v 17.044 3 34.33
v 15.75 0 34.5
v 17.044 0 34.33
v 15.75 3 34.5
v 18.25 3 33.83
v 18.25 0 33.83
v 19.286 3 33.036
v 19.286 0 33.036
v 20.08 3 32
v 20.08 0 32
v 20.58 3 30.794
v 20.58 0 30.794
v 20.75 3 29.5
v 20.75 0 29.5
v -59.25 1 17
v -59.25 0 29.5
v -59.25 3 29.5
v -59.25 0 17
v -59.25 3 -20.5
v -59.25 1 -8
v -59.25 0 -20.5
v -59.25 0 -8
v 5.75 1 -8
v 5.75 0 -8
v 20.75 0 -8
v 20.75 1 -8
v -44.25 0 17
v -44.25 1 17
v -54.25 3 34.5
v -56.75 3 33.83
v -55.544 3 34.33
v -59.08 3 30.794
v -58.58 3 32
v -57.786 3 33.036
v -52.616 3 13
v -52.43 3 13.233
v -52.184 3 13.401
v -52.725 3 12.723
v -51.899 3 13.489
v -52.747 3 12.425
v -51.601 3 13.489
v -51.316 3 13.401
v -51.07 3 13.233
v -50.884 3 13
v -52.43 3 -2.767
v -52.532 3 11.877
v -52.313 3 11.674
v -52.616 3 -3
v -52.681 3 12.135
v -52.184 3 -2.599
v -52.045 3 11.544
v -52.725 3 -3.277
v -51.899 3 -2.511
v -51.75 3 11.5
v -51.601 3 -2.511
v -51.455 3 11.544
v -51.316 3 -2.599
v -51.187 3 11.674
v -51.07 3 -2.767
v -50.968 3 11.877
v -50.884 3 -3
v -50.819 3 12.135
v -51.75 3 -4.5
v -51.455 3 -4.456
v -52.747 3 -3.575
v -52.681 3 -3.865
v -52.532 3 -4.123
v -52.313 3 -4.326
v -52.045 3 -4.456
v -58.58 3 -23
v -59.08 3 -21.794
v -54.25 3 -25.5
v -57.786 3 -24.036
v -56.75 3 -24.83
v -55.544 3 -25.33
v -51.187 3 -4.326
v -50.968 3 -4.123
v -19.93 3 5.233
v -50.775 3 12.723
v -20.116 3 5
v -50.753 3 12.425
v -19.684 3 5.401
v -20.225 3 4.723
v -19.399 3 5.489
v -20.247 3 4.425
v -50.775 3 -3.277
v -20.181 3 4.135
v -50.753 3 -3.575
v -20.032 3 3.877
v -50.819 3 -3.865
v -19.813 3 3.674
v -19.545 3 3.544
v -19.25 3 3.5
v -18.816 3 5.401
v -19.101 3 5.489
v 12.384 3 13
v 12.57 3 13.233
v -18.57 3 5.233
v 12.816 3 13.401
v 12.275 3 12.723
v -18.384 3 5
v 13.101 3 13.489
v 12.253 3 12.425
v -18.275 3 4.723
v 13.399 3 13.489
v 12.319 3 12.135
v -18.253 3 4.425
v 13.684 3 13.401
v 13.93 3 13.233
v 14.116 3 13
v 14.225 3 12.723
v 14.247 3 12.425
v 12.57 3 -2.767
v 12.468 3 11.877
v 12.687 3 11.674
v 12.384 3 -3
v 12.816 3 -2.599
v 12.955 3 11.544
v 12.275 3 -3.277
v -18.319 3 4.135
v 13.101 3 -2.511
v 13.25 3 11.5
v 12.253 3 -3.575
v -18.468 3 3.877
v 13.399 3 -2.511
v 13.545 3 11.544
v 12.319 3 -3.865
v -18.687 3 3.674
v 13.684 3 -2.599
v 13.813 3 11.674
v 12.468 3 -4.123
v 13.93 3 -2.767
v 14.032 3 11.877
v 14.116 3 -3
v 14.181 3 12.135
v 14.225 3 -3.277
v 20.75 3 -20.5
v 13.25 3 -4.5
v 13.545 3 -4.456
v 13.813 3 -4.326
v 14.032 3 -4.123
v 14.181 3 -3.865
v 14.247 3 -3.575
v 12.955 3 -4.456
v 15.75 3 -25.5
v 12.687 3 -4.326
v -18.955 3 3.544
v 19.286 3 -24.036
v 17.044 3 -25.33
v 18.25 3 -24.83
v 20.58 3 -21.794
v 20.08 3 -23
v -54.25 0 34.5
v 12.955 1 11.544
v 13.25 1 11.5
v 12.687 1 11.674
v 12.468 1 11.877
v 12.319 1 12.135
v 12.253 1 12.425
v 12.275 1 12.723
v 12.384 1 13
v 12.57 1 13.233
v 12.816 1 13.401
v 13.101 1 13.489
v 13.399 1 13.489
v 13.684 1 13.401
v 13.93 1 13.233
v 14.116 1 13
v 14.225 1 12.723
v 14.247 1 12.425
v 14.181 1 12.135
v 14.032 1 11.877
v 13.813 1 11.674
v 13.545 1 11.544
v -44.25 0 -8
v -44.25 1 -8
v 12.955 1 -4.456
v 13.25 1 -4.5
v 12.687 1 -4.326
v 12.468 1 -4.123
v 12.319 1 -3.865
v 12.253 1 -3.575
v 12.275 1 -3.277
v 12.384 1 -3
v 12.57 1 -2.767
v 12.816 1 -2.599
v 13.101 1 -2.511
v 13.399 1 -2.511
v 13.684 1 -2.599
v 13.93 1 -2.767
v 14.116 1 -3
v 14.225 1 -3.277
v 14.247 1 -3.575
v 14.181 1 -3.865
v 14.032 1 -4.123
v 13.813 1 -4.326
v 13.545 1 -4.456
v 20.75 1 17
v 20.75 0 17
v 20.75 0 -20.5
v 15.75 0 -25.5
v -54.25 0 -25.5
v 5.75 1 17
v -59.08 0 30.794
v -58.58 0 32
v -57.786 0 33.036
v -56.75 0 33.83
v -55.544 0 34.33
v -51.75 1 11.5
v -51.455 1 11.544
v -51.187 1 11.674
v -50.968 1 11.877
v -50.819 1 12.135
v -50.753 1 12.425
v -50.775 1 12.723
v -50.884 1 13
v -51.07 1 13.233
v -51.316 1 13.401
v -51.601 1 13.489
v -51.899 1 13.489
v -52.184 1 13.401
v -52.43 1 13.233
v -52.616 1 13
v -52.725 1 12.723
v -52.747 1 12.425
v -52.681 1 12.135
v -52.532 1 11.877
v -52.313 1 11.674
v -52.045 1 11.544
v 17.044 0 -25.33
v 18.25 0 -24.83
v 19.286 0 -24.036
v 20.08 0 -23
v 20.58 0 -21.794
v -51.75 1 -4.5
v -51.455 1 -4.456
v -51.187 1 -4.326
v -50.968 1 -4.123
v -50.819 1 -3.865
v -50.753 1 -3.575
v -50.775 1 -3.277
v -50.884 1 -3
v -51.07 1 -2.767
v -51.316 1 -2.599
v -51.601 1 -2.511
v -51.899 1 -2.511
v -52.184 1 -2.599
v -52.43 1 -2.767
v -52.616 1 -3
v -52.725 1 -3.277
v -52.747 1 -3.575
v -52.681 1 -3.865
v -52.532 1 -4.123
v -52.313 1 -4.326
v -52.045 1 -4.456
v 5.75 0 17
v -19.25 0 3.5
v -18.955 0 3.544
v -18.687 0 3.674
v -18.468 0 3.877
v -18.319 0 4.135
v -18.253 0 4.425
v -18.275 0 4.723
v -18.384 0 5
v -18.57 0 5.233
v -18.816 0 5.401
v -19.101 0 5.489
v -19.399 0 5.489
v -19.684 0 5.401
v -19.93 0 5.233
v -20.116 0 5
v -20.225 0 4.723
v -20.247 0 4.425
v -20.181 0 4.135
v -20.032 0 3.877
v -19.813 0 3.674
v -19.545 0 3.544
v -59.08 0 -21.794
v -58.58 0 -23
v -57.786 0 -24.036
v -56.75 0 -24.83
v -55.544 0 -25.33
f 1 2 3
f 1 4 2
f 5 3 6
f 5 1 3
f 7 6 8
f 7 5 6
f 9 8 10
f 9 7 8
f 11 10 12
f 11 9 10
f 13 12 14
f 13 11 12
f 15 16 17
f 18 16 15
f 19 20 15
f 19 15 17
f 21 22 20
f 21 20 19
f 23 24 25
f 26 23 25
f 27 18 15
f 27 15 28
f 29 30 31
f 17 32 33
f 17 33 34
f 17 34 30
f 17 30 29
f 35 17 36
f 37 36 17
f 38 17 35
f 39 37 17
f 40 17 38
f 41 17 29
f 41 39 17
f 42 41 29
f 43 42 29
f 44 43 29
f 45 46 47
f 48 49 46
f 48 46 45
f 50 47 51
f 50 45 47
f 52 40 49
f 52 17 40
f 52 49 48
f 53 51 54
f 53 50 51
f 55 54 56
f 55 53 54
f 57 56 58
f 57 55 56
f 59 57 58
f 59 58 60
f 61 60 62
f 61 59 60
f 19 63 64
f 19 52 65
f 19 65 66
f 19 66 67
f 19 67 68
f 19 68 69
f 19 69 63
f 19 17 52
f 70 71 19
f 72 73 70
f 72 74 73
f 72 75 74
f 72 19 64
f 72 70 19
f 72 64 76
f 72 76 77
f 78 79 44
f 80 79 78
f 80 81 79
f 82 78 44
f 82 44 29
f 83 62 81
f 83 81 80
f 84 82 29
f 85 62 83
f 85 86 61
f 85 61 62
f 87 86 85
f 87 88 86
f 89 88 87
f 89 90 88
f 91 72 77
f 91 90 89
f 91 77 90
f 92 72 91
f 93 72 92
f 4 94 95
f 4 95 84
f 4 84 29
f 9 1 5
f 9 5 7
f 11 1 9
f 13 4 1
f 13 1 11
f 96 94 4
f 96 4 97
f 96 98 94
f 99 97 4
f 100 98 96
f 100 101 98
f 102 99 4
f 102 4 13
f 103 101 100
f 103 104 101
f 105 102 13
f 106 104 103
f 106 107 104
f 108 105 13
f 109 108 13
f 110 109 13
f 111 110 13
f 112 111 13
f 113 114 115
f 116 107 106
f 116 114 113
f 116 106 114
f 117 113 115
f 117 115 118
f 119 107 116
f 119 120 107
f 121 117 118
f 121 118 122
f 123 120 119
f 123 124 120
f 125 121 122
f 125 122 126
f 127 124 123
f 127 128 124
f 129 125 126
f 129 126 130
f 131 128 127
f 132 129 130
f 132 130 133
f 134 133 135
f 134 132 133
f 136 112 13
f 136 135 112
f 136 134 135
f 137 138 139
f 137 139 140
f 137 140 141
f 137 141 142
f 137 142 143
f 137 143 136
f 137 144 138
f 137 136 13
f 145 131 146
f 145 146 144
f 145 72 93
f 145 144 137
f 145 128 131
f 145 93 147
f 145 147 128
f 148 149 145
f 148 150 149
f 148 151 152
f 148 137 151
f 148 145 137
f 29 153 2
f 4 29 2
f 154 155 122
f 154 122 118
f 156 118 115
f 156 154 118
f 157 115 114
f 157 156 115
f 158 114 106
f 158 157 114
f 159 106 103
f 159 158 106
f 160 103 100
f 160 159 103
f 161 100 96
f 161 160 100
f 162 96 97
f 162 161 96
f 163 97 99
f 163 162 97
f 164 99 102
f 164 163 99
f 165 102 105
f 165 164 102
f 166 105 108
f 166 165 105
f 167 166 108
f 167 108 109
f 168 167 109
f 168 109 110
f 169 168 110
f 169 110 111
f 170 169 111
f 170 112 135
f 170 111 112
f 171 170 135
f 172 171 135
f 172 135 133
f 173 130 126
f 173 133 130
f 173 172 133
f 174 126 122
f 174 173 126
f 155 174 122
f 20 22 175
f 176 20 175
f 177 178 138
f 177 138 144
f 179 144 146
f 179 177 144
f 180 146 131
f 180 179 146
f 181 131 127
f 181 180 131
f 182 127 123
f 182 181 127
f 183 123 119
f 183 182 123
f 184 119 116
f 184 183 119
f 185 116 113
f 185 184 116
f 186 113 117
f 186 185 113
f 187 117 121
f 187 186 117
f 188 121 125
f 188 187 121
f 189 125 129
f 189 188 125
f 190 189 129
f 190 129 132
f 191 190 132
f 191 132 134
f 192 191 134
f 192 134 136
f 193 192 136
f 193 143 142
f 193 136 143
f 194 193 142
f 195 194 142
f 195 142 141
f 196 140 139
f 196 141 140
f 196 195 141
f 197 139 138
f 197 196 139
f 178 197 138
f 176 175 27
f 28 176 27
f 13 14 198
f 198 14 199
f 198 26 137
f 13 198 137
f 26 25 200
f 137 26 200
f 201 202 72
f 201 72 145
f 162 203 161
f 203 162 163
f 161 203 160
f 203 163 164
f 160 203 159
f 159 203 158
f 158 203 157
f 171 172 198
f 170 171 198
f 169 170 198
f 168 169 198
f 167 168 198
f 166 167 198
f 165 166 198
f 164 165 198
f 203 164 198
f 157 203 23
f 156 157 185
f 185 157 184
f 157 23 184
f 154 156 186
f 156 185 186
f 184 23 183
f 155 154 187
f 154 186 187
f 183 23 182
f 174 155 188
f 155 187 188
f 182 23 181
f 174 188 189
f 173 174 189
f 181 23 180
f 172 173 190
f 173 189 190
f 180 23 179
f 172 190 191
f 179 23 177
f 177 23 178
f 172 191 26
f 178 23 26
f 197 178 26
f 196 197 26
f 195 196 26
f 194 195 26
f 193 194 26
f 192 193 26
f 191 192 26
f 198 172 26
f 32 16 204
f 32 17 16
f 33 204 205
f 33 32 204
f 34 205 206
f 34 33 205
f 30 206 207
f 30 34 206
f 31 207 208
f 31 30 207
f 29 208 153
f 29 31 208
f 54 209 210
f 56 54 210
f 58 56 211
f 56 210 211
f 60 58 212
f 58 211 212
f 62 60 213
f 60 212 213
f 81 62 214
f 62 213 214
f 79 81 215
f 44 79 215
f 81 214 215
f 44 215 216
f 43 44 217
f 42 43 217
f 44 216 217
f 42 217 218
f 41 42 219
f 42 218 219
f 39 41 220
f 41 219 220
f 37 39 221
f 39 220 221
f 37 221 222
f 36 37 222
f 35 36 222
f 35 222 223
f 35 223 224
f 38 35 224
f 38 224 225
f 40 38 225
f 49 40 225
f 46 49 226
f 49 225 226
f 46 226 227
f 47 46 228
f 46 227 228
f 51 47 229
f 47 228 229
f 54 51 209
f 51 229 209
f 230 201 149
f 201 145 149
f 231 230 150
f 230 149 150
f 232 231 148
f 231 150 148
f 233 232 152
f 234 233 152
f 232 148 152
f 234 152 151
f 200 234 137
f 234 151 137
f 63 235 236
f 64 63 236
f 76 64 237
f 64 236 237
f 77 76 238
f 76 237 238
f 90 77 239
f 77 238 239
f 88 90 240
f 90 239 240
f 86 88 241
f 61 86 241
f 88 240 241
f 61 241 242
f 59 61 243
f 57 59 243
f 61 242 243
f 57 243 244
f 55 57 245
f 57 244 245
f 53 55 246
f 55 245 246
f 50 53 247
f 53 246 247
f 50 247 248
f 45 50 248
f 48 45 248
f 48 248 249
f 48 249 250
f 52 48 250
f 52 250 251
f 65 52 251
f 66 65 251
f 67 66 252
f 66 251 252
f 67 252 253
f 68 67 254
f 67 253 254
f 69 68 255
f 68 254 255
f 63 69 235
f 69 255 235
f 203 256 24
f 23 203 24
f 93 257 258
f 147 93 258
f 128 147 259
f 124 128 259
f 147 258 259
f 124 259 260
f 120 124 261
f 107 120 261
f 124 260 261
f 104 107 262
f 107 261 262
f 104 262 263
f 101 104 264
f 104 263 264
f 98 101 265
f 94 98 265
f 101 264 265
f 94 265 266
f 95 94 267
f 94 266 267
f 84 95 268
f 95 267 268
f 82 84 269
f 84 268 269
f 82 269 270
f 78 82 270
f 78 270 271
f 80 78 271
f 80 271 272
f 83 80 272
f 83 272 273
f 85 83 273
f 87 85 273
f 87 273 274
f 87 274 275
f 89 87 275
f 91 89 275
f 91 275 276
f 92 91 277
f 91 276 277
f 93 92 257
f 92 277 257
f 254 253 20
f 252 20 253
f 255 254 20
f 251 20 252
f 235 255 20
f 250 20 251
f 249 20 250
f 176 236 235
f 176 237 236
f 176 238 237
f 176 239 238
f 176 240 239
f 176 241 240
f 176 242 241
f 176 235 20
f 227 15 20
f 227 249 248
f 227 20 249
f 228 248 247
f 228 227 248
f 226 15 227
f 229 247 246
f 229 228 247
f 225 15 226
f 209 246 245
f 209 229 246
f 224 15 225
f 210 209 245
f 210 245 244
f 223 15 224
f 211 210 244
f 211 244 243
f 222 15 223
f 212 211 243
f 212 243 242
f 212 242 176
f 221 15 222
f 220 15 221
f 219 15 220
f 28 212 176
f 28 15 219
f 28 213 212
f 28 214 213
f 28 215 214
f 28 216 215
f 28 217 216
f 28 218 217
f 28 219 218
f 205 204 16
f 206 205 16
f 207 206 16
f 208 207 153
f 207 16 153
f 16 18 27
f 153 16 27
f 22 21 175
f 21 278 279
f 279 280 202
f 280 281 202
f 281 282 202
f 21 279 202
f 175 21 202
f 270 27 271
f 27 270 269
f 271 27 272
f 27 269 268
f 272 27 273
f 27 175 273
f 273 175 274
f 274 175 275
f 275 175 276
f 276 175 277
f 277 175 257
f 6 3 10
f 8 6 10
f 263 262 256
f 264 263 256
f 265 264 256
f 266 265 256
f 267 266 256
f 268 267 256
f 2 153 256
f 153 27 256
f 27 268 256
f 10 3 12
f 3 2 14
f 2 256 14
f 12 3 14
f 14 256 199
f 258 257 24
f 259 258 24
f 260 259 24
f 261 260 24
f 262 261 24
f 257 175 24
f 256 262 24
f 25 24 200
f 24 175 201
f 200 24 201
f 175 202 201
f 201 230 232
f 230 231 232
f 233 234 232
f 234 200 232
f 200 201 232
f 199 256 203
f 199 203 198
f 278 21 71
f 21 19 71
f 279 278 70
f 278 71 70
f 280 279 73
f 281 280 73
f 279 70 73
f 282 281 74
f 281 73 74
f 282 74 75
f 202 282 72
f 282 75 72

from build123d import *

# Parameters (mm, degrees)
SKETCH2_W           = 80
SKETCH2_H           = 60
BOSS_EXTRUDE1_DEPTH = 3
SKETCH3_W           = 15
SKETCH3_H           = 25
CUT_EXTRUDE1_DEPTH  = 1
SKETCH4_R           = 1
CUT_EXTRUDE3_DEPTH  = 2
FILLET1_R           = 5
SKETCH5_R           = 1
CUT_EXTRUDE4_DEPTH  = 3
SKETCH6_W           = 15
SKETCH6_H           = 25
CUT_EXTRUDE6_DEPTH  = 1
SKETCH7_R           = 1
CUT_EXTRUDE7_DEPTH  = 7


with BuildPart() as part:
    # Sketch2 → Boss-Extrude1 (new body)
    with BuildSketch(Plane(origin=(0, 0, 0), x_dir=(1, 0, 0), z_dir=(0, 1, 0))):
        with Locations((-19.25, -4.5)):
            Rectangle(SKETCH2_W, SKETCH2_H)
    extrude(amount=BOSS_EXTRUDE1_DEPTH)

    # Sketch3 → Cut-Extrude1 (cut)
    with BuildSketch(Plane.XZ):
        with Locations((-51.75, 4.5)):
            Rectangle(SKETCH3_W, SKETCH3_H)
    extrude(amount=-CUT_EXTRUDE1_DEPTH, mode=Mode.SUBTRACT)

    # Sketch4 → Cut-Extrude3 (cut)
    with BuildSketch(Plane.XZ.offset(-1)):
        with Locations(Location((-51.75, 12.5, 0), (0, 0, 270))):
            Circle(SKETCH4_R)
        with Locations(Location((-51.75, -3.5, 0), (0, 0, 270))):
            Circle(SKETCH4_R)
    extrude(amount=-CUT_EXTRUDE3_DEPTH, mode=Mode.SUBTRACT)

    # Fillet1
    fillet1_edges = [part.edges().sort_by_distance(p)[0] for p in [
        (-59.25, 1.5, -25.5),
        (20.75, 1.5, -25.5),
        (20.75, 1.5, 34.5),
        (-59.25, 1.5, 34.5),
    ]]
    fillet(fillet1_edges, radius=FILLET1_R)

    # Sketch5 → Cut-Extrude4 (cut)
    with BuildSketch(Plane.XZ):
        with Locations(Location((-19.25, 4.5, 0), (0, 0, 270))):
            Circle(SKETCH5_R)
    extrude(amount=-CUT_EXTRUDE4_DEPTH, mode=Mode.SUBTRACT)

    # Sketch6 → Cut-Extrude6 (cut)
    with BuildSketch(Plane(origin=(0, 0, 0), x_dir=(1, 0, 0), z_dir=(0, 1, 0))):
        with Locations((13.25, -4.5)):
            Rectangle(SKETCH6_W, SKETCH6_H)
    extrude(amount=CUT_EXTRUDE6_DEPTH, mode=Mode.SUBTRACT)

    # Sketch7 → Cut-Extrude7 (cut)
    with BuildSketch(Plane(origin=(0, 0, 0), x_dir=(1, 0, 0), z_dir=(0, 1, 0))):
        with Locations(Location((13.25, 3.5, 0), (0, 0, 90))):
            Circle(SKETCH7_R)
        with Locations(Location((13.25, -12.5, 0), (0, 0, 90))):
            Circle(SKETCH7_R)
    extrude(amount=CUT_EXTRUDE7_DEPTH, mode=Mode.SUBTRACT)


solid = part.part
